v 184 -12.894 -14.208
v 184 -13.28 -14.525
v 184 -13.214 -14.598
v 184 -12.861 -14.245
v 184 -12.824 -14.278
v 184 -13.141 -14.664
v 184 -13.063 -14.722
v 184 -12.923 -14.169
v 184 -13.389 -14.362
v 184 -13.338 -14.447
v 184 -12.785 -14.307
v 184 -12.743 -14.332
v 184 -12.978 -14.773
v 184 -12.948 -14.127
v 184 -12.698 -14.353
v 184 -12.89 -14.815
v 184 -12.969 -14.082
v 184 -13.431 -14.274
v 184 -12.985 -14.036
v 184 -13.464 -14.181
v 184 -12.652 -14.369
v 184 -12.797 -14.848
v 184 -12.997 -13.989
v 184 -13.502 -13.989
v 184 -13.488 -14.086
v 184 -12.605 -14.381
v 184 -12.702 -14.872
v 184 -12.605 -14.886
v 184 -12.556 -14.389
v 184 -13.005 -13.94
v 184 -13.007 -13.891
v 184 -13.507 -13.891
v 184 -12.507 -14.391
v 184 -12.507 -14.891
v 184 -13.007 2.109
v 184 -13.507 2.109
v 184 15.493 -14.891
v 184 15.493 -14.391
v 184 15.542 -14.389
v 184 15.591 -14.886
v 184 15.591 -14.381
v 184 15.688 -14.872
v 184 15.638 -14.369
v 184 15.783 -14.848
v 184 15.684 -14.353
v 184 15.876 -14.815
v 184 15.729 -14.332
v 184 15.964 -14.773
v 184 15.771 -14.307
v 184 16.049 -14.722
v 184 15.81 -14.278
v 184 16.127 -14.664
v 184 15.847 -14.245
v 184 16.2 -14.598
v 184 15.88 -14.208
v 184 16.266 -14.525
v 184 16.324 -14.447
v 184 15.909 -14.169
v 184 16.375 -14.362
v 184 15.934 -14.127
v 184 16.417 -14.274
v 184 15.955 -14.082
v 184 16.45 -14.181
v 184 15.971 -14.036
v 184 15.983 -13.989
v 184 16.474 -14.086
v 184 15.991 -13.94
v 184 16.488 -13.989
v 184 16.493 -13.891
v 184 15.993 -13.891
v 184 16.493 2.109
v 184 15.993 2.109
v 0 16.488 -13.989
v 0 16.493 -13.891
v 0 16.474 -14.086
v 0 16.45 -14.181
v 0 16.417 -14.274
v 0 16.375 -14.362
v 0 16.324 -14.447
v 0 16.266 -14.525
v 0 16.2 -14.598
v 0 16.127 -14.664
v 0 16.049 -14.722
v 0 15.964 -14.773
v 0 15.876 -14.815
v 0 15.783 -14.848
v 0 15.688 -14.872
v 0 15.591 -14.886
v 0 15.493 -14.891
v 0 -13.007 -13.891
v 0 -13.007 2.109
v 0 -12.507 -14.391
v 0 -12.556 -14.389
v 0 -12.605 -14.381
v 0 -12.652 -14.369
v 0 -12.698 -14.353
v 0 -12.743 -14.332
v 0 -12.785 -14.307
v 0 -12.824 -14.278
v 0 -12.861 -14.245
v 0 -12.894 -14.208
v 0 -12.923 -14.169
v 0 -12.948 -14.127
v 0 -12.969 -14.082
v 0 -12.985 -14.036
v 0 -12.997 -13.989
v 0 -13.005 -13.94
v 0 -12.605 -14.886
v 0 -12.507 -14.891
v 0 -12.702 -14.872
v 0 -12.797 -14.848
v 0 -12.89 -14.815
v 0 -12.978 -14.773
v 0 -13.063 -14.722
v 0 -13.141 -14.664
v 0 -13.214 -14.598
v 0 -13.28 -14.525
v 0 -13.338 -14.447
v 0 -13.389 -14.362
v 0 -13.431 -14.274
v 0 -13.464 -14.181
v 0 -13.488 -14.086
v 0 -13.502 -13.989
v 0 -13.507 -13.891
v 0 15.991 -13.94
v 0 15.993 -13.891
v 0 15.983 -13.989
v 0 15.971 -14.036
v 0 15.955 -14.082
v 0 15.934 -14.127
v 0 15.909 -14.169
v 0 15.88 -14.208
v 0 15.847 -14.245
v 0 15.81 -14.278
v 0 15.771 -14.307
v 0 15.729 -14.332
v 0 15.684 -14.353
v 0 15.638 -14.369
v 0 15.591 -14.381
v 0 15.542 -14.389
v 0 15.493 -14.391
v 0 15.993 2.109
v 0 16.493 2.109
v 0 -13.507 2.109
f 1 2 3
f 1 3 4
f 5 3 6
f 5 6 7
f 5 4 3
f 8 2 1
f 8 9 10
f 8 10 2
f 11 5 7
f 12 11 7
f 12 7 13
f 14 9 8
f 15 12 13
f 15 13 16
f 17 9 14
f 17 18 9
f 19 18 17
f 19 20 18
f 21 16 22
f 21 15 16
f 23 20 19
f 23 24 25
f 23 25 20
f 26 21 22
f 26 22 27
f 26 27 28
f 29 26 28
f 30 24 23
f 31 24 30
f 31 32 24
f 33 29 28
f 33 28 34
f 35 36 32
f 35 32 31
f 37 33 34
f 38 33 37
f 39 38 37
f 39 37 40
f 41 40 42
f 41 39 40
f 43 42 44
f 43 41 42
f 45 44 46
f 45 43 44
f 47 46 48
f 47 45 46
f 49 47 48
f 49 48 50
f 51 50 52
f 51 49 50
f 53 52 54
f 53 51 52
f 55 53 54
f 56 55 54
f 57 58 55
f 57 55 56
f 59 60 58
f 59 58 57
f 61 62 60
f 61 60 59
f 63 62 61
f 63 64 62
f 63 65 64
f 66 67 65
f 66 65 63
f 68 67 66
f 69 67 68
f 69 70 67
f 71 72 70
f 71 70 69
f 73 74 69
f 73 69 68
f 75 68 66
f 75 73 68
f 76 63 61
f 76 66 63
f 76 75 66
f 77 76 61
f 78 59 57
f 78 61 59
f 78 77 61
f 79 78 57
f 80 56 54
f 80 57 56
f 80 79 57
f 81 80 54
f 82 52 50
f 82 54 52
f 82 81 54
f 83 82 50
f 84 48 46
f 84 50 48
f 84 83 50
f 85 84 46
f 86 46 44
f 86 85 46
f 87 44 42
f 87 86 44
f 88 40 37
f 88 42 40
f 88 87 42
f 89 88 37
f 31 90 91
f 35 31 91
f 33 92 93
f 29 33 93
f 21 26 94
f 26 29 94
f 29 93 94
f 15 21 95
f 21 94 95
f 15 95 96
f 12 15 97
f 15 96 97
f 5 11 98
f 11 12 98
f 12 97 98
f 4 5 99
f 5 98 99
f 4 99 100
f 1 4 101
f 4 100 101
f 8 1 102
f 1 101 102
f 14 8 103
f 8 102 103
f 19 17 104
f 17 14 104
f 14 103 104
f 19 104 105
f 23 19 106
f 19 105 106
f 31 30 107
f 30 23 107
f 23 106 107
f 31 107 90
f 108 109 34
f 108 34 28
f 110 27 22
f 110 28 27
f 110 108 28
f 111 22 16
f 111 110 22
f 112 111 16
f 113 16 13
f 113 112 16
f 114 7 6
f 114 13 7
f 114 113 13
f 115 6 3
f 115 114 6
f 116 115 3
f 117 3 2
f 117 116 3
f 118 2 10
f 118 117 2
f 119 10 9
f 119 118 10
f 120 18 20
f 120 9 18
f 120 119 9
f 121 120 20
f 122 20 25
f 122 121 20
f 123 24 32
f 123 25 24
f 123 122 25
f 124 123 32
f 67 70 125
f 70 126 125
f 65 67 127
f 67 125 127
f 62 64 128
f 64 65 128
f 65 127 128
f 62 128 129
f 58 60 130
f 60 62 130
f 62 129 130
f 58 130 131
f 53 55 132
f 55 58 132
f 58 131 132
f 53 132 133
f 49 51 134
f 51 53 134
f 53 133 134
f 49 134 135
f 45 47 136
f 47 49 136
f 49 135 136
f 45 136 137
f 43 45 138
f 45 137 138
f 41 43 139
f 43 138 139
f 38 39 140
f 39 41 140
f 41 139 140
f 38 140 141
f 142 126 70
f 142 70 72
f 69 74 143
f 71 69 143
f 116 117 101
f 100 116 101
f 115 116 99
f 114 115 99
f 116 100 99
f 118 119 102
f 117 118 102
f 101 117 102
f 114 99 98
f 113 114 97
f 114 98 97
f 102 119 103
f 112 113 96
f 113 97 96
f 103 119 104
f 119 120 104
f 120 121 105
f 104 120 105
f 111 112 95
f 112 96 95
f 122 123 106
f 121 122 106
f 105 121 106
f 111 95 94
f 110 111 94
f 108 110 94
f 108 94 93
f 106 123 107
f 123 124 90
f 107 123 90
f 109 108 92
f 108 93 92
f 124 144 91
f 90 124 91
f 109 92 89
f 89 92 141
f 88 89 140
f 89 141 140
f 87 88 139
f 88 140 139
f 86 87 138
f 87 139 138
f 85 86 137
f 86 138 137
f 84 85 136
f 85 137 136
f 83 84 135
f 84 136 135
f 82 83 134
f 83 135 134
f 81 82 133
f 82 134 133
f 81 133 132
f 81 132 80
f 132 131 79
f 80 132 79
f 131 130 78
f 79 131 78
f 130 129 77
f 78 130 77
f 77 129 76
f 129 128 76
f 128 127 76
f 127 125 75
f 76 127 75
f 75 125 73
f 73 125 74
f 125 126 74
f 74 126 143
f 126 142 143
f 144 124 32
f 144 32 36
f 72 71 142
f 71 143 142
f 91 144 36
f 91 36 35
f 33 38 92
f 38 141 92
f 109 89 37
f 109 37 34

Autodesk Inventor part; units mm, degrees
ref_plane "YZ Plane" through (0, 0, 0) normal (1, 0, 0) x (0, 1, 0)
ref_plane "XZ Plane" through (0, 0, 0) normal (0, 1, 0) x (-1, 0, 0)
ref_plane "XY Plane" through (0, 0, 0) normal (0, 0, 1) x (1, 0, 0)
sketch "Szkic1" plane through (0, 0, 0) normal (1, 0, 0) x (0, 1, 0)
  line L0 (-19.507, 0) -> (22.493, 0)
  line L1 (0, -18.291) -> (0, 5.509)
  line L2 (16.493, -14.891) -> (-13.507, -14.891)
  line L3 (-13.507, -14.891) -> (-13.507, 2.109)
  line L4 (16.493, -14.891) -> (16.493, 2.109)
  point P0 (0, 0)
  dimension "d1" = 30
  dimension "d2" = 17
  dimension "d3" = 17
contour flange "Kołnierz z profilu1" sketch "Szkic1" thickness 0.5 bend radius 0.5 width 184 along (1, 0, 0) mid plane no both sides no wall seen from (0, 16.493, -6.391) lies toward (0, -1, 0) curves L4 L2 L3
bend "Gięcie1"
corner "Narożnik1"
equation "\"d3\" = d2"
equation "\"d4\" = SzerokośćGięciaPodcięcia"
equation "\"d5\" = GłębokośćGięciaPodcięcia"
equation "\"d6\" = MinimalnaPozostałość"
equation "\"d7\" = PromieńGięcia"
equation "\"d9\" = PromieńGięcia"
equation "\"d11\" = RozmiarPodcięciaNarożnika"
equation "\"d12\" = Wielk_odstępu"
equation "\"d13\" = Rozmiar_promienia_Jacobiego"
equation "\"PromieńGięcia\" = Grubość"
equation "\"SzerokośćGięciaPodcięcia\" = Grubość"
equation "\"GłębokośćGięciaPodcięcia\" = 0.5 * Grubość"
equation "\"RozmiarPodcięciaNarożnika\" = 4 * Grubość"
equation "\"MinimalnaPozostałość\" = 2 * Grubość"
equation "\"PromieńPrzejścia\" = PromieńGięcia"
equation "\"Rozmiar_promienia_Jacobiego\" = PromieńGięcia"
equation "\"Wielk_odstępu\" = Grubość"
equation "\"Grubość\" = 0.5"
